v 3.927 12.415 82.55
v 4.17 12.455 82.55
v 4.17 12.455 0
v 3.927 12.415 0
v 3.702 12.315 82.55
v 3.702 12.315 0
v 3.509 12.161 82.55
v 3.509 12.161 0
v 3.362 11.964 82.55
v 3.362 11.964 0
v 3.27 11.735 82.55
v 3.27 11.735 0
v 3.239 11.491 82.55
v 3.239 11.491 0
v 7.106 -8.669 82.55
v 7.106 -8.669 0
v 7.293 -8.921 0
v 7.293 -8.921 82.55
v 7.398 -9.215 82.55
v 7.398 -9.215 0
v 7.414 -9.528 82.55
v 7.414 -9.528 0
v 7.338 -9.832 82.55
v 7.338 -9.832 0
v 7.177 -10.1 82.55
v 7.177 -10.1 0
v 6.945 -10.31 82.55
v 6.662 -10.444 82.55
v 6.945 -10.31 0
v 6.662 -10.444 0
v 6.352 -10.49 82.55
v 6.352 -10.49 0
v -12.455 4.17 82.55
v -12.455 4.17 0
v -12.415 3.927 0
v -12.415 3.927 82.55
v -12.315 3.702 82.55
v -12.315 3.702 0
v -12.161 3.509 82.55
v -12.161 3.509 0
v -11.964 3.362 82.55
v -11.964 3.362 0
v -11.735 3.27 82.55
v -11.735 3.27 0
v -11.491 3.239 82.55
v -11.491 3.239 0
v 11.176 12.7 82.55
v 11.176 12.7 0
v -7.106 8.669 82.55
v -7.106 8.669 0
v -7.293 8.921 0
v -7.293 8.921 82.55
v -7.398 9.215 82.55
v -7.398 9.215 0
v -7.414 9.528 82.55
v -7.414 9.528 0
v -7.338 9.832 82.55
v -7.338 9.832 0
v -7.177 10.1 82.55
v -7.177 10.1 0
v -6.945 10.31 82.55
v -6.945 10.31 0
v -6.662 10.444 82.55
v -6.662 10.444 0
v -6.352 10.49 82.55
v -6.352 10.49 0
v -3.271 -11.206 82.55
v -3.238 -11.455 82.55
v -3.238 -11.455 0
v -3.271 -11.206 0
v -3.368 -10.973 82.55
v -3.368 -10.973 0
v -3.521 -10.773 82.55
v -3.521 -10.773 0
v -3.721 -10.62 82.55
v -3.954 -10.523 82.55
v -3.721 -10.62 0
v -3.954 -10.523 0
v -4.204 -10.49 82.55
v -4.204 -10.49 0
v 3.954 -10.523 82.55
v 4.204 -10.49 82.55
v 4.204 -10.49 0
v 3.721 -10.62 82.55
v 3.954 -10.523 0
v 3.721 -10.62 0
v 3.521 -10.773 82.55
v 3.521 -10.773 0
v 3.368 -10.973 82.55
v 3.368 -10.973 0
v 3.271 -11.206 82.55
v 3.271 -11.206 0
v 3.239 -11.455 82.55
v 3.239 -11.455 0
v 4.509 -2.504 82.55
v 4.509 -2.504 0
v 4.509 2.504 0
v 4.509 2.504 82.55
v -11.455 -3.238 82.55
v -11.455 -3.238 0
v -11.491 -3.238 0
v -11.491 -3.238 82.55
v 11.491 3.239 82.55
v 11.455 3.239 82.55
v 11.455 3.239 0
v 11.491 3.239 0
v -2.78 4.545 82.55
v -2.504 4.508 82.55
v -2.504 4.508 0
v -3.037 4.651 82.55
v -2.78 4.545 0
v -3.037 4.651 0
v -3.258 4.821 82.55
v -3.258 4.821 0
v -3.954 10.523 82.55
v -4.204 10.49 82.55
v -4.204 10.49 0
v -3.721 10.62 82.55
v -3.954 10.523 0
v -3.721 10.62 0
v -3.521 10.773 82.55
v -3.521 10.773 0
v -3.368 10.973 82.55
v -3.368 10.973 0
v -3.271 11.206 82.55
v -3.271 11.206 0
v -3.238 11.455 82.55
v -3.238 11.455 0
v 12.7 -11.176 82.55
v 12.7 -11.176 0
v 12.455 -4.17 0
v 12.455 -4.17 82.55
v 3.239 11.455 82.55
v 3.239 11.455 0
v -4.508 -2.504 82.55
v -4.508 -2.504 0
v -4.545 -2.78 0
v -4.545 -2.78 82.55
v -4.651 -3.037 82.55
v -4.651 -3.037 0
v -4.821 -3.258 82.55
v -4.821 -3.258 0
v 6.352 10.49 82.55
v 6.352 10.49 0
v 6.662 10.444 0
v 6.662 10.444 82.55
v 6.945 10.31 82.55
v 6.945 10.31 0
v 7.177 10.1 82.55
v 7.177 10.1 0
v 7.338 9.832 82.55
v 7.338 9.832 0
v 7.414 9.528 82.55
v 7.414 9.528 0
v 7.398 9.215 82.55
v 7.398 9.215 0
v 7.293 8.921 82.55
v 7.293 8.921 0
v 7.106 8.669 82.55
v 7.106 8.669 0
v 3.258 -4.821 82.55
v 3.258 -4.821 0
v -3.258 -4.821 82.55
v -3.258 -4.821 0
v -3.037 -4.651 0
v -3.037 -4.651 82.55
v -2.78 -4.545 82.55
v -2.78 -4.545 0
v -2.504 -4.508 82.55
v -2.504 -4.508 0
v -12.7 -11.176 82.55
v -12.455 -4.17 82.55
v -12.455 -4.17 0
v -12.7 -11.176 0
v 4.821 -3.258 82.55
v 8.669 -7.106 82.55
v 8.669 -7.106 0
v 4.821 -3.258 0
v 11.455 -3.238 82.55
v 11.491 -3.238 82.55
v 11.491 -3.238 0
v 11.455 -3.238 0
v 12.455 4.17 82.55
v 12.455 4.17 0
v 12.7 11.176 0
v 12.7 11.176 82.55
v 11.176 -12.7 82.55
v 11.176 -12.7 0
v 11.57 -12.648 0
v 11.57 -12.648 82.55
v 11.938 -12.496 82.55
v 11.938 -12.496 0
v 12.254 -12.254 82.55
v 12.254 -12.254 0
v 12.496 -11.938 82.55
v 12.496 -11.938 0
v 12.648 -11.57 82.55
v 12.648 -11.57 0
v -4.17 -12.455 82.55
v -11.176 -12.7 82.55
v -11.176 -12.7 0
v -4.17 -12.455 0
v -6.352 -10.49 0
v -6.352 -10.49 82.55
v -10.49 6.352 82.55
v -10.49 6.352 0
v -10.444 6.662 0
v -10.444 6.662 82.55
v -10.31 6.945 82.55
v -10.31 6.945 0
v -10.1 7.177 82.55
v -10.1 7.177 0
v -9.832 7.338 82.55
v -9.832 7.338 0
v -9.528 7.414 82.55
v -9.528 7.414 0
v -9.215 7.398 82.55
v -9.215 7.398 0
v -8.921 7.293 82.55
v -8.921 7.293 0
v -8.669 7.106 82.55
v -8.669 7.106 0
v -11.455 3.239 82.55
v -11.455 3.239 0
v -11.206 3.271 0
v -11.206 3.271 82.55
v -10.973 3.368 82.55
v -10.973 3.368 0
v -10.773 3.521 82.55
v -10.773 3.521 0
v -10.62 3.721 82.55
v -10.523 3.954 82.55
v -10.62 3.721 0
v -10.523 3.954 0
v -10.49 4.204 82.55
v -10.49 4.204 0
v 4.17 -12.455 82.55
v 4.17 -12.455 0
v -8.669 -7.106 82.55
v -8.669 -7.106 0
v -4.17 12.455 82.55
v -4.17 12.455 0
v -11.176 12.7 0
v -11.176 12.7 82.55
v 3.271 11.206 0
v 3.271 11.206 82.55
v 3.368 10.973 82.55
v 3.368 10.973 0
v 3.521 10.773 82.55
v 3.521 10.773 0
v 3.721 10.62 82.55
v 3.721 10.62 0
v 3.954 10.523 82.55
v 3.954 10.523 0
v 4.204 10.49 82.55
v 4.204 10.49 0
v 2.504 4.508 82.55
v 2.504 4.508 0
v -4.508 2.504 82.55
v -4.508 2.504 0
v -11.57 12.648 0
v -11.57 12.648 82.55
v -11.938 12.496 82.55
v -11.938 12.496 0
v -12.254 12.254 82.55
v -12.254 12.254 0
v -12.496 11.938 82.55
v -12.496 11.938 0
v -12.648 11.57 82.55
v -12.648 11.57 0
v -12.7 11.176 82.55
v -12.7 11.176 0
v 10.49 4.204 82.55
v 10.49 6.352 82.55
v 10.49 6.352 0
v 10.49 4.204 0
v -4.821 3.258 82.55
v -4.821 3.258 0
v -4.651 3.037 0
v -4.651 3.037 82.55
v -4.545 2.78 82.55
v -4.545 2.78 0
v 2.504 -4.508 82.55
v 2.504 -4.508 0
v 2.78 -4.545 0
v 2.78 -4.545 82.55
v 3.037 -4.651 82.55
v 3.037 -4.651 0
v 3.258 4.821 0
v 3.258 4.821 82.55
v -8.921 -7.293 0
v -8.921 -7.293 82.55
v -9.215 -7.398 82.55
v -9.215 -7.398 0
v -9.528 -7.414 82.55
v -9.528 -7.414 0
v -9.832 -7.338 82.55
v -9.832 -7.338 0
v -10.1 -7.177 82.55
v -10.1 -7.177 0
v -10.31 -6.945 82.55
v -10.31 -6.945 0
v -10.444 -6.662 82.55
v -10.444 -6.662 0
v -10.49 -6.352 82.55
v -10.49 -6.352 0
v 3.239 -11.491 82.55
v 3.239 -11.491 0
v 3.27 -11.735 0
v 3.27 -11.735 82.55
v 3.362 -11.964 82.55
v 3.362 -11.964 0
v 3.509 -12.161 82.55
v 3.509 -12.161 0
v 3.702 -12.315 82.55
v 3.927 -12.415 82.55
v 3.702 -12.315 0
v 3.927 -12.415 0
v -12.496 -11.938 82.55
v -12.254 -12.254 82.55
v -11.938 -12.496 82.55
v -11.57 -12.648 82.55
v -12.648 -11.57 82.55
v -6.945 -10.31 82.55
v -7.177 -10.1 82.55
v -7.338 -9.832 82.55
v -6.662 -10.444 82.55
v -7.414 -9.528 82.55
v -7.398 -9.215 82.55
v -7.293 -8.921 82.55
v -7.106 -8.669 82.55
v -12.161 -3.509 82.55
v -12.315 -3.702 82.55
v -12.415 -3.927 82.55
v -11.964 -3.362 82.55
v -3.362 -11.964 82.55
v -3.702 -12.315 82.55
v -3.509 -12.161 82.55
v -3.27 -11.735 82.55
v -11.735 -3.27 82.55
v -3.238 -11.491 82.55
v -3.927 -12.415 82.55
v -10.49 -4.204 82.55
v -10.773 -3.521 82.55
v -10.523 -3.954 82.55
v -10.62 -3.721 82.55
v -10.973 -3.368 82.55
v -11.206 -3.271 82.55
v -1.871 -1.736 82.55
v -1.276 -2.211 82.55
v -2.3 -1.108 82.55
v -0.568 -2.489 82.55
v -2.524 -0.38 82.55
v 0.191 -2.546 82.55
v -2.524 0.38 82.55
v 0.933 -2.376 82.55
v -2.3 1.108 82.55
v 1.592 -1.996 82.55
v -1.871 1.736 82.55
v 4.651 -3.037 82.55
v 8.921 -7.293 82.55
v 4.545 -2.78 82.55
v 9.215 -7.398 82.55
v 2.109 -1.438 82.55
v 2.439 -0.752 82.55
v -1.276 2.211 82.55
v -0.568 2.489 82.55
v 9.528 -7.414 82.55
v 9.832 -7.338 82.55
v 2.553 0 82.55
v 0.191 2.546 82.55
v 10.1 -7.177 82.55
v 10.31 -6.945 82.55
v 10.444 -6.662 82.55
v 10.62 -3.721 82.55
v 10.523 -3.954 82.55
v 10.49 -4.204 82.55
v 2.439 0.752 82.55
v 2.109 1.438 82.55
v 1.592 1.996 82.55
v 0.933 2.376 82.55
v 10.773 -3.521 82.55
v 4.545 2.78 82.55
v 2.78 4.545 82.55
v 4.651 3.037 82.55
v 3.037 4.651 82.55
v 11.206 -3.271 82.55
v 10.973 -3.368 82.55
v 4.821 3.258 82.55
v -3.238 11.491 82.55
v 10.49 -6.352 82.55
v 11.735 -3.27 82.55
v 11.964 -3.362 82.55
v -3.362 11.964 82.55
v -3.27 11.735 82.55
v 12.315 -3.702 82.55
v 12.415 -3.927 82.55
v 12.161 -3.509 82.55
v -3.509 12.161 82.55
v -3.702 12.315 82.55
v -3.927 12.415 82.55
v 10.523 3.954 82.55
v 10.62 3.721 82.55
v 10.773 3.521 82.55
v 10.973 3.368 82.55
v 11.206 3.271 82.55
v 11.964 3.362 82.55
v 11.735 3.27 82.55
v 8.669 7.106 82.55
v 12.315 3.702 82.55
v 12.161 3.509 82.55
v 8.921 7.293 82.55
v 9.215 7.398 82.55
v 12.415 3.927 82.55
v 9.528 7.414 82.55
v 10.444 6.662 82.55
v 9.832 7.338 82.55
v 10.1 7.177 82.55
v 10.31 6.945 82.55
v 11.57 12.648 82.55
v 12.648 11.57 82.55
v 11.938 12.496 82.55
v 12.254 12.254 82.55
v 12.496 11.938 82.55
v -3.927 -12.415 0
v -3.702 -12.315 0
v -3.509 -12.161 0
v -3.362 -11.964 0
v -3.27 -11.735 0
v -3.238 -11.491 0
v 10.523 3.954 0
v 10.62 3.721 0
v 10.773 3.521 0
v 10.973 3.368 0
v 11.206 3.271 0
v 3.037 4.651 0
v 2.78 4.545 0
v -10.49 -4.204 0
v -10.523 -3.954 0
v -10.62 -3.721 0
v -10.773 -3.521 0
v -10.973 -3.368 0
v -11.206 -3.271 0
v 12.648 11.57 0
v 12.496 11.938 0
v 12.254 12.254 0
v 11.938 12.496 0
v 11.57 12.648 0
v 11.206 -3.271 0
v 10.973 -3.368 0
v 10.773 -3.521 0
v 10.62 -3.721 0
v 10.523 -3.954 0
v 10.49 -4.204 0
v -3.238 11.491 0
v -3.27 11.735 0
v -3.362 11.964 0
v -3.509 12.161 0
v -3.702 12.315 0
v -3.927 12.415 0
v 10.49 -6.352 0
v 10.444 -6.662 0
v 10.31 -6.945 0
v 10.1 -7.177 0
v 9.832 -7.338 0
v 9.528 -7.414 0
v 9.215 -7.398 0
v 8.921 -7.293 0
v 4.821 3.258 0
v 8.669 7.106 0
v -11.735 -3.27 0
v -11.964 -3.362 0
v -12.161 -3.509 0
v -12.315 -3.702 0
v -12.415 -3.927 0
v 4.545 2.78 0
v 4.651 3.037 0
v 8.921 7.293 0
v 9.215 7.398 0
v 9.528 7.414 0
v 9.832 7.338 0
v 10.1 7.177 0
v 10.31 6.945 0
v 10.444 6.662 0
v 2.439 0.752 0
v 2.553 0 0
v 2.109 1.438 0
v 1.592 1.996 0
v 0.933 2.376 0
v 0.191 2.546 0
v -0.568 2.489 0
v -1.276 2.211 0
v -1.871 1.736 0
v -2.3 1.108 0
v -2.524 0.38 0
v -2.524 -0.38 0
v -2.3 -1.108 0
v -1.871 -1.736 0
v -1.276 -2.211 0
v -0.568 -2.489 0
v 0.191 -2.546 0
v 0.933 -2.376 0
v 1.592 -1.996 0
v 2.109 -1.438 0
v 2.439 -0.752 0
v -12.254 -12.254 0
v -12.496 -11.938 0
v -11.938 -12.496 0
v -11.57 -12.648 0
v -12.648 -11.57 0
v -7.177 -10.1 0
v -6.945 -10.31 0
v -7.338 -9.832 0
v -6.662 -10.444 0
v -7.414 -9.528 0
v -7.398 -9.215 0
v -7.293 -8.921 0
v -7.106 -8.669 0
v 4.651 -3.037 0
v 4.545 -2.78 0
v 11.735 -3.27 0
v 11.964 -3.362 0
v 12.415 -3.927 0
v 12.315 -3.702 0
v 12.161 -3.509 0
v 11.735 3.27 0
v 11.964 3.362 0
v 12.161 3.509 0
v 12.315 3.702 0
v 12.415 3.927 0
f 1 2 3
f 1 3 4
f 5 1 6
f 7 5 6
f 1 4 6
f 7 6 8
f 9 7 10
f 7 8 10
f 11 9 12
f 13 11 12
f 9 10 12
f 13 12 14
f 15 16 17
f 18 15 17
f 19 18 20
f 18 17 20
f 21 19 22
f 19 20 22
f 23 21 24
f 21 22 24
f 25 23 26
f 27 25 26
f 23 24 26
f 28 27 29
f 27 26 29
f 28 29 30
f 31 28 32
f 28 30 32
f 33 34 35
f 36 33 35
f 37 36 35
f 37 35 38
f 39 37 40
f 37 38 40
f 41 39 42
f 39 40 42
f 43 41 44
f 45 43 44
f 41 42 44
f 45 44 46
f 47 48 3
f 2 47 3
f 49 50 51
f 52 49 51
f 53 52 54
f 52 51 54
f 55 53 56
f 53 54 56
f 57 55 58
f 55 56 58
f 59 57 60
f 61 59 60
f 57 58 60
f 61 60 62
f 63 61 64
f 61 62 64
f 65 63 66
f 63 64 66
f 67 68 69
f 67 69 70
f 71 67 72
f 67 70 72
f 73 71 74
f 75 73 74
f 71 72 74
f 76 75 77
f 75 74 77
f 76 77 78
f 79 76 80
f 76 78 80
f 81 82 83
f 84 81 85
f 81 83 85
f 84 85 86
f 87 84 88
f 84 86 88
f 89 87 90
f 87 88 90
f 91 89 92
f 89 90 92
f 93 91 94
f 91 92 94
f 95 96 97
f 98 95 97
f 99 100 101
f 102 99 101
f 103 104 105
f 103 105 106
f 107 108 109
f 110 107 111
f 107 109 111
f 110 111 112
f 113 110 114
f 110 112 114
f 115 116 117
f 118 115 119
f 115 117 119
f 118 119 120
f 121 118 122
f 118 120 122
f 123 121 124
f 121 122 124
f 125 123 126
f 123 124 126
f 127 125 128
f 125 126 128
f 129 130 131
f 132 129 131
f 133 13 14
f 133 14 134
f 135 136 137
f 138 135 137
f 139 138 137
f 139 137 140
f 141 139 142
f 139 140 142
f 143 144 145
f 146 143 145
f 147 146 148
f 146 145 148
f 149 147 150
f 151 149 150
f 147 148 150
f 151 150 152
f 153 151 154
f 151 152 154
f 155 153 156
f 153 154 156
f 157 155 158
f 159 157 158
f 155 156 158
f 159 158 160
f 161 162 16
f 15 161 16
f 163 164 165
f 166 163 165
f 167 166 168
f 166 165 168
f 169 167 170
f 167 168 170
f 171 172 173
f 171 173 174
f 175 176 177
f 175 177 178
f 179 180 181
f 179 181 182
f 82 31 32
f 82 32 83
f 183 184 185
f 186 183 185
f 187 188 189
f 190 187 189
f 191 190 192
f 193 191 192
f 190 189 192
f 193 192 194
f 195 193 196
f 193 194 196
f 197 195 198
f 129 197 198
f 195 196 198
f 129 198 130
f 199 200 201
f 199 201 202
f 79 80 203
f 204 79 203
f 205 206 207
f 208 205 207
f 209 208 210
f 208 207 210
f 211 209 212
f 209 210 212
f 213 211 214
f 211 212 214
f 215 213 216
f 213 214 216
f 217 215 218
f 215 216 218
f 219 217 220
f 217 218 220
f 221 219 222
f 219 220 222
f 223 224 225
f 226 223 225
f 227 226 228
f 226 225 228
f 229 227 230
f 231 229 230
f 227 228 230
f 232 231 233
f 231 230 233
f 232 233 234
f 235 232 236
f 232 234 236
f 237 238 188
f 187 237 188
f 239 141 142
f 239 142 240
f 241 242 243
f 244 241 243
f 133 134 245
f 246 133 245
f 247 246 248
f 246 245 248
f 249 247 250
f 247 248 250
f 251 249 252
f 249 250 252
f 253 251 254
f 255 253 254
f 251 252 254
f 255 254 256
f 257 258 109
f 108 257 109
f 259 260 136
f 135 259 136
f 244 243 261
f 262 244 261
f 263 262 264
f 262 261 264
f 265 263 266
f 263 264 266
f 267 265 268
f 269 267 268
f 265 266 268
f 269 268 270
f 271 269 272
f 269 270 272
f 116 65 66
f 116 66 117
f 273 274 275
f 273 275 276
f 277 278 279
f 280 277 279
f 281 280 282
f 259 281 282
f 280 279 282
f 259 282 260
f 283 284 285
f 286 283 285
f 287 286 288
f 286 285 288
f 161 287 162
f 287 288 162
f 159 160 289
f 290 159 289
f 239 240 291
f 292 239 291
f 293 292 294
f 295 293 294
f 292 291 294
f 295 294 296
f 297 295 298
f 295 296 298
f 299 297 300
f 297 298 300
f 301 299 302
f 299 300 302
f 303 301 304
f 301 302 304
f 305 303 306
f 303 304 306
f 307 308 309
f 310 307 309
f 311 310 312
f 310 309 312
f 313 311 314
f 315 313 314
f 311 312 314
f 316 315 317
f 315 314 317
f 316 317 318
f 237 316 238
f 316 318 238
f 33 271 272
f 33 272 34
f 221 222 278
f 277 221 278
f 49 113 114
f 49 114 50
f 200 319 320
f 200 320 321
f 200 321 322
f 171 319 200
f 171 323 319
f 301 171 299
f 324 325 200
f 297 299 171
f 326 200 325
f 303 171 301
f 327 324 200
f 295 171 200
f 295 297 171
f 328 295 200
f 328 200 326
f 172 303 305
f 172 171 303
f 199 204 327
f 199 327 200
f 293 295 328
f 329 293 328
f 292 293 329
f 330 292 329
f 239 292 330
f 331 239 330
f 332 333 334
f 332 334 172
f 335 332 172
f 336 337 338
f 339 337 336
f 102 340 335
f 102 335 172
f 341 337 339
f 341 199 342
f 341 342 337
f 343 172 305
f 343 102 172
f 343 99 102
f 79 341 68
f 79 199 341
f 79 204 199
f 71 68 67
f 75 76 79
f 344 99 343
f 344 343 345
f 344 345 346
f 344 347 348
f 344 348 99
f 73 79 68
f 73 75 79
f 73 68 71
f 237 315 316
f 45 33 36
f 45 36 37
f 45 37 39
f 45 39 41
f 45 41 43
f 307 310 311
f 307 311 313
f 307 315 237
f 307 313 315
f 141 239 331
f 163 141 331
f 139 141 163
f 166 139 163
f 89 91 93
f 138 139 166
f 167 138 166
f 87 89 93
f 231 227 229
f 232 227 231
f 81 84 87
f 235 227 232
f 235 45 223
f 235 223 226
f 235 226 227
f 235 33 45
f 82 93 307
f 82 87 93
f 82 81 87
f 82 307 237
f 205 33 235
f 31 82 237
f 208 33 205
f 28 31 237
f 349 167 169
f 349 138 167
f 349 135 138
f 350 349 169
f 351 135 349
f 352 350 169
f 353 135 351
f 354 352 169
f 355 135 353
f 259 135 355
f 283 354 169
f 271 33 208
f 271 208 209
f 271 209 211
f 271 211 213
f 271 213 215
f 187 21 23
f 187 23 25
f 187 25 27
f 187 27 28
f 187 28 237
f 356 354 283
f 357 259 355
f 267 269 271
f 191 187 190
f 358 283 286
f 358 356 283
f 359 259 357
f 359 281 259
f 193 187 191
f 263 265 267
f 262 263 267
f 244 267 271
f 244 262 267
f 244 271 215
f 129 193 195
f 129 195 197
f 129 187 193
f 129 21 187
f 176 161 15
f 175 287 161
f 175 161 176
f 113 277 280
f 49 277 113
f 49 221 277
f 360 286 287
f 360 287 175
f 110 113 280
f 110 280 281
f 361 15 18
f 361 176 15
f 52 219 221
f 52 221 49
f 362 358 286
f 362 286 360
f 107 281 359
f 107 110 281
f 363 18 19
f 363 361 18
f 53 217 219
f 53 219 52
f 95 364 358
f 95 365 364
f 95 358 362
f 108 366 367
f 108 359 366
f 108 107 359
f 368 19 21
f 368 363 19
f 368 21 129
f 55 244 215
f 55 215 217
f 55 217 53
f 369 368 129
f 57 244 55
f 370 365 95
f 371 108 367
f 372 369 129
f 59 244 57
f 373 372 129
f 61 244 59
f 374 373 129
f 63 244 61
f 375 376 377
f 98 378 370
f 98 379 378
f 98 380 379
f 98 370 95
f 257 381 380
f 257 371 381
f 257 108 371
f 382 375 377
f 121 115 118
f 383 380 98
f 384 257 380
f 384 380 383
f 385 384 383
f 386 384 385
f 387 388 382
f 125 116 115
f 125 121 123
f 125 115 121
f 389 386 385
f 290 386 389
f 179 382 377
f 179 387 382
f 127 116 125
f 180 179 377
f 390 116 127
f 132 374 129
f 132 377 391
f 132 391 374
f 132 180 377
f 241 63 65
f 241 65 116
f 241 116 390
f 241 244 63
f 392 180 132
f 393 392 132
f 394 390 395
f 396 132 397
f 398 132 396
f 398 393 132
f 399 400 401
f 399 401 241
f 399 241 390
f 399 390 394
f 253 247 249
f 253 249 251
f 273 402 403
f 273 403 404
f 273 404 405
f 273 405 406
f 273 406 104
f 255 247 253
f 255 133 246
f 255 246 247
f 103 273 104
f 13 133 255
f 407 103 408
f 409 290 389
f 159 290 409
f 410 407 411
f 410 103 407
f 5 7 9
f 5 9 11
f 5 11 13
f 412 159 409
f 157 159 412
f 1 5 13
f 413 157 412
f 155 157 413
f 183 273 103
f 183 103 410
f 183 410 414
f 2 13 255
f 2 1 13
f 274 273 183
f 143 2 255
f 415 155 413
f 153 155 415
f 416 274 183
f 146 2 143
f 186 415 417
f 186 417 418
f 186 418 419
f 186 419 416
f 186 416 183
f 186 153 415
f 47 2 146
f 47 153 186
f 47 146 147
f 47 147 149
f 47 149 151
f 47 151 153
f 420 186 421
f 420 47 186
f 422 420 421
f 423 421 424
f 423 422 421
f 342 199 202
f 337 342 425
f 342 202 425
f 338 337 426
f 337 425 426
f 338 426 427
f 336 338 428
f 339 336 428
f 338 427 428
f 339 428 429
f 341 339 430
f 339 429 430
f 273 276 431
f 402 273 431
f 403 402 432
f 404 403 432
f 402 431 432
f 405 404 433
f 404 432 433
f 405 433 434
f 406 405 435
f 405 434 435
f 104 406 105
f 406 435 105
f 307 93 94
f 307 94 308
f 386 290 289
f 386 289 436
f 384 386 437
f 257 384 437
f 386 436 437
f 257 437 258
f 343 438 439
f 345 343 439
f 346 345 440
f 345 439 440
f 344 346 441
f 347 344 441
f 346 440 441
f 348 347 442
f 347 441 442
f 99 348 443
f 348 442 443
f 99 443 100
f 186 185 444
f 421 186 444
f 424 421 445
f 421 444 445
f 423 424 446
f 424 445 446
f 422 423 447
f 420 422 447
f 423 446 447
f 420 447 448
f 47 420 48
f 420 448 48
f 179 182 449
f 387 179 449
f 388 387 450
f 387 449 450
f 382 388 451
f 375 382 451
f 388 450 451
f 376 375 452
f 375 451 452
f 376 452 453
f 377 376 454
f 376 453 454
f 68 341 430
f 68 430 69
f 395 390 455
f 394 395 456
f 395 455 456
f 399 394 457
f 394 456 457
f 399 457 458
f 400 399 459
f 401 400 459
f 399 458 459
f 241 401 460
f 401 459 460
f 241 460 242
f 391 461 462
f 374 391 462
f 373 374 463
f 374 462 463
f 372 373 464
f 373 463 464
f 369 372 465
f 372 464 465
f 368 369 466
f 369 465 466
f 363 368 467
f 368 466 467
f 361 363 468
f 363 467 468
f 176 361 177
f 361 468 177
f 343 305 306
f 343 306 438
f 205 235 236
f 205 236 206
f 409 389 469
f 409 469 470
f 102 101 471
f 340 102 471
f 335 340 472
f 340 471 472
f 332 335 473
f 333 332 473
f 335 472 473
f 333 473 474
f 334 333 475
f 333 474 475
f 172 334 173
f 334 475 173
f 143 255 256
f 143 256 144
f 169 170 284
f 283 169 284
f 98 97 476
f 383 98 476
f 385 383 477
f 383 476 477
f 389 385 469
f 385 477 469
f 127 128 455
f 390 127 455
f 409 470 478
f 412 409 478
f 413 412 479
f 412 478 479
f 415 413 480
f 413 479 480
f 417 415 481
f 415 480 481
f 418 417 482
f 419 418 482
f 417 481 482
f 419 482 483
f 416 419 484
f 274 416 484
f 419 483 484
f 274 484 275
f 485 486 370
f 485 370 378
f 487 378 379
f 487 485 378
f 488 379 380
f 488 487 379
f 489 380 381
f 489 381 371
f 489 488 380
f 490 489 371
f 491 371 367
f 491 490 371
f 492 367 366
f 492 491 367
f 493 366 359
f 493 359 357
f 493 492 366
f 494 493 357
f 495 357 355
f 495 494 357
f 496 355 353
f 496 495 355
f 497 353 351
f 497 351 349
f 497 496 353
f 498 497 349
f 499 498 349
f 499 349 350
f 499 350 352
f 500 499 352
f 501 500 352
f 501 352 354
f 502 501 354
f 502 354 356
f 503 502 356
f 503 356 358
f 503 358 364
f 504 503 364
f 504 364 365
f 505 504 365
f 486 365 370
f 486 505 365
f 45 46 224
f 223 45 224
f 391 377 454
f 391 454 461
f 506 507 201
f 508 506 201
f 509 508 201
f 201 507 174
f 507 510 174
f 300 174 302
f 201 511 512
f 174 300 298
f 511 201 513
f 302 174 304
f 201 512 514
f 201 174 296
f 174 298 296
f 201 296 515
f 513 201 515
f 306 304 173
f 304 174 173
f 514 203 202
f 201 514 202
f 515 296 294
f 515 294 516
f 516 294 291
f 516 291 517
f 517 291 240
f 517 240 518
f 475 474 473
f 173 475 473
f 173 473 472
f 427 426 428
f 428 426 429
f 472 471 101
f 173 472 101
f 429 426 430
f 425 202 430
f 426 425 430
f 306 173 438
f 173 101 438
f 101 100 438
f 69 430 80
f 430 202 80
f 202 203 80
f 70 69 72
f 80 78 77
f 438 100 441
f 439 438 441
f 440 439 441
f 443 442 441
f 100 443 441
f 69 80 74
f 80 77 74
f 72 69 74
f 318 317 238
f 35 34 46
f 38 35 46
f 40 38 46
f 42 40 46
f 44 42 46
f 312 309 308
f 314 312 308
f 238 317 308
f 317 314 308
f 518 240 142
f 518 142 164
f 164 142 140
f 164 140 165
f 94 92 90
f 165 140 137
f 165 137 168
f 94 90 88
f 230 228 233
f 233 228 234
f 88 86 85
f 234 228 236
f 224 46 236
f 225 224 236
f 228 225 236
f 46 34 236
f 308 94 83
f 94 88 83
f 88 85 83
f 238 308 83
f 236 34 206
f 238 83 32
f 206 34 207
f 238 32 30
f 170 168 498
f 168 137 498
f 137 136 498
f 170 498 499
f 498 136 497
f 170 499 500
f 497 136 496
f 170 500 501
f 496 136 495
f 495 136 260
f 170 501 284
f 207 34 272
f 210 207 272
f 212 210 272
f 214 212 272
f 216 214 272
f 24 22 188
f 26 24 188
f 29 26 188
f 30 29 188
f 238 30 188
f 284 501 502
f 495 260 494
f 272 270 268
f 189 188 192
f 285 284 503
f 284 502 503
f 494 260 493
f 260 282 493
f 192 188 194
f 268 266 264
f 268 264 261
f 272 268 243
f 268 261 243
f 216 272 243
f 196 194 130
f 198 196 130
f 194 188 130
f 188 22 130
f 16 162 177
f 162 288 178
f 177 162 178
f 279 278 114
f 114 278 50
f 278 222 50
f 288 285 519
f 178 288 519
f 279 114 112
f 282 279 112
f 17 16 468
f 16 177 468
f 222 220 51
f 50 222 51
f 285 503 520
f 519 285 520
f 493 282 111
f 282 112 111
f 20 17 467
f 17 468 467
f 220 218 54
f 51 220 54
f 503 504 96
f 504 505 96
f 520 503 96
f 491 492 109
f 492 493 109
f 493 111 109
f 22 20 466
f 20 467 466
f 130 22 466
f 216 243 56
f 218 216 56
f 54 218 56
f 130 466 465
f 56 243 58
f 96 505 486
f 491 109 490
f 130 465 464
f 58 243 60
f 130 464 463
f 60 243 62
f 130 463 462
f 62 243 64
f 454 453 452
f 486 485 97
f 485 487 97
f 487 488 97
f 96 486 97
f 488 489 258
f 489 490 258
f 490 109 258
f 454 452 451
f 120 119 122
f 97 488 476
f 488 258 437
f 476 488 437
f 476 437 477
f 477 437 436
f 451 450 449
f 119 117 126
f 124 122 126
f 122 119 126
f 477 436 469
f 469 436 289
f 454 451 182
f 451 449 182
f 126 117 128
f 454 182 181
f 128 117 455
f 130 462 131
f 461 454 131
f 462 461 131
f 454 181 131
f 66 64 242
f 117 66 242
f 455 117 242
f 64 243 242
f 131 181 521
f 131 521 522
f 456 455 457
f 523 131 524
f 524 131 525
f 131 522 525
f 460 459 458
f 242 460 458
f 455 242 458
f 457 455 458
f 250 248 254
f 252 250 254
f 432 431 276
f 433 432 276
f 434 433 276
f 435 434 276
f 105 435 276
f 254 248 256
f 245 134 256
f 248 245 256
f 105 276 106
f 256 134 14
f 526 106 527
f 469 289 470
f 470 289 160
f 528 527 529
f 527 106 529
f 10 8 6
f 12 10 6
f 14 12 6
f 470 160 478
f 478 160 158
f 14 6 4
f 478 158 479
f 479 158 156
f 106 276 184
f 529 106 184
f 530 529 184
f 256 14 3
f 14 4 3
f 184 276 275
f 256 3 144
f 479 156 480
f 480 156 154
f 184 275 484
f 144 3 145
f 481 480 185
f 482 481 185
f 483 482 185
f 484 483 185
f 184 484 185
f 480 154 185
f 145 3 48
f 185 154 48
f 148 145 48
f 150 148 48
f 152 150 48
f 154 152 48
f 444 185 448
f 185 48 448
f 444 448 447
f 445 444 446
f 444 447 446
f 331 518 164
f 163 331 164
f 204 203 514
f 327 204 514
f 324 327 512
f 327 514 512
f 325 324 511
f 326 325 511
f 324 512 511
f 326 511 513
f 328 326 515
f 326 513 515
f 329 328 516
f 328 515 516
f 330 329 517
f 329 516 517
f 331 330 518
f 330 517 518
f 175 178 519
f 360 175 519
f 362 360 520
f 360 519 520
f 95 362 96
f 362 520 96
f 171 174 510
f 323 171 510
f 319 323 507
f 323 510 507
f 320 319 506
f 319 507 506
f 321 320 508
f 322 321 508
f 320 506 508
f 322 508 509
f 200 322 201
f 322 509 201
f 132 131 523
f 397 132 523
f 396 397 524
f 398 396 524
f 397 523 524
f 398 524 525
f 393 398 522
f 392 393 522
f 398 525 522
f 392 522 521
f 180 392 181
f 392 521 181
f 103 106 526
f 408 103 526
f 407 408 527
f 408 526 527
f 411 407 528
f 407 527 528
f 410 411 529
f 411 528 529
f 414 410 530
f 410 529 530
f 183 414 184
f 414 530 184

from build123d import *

# Parameters (mm, degrees)
SKETCH1_R      = 2.5527
EXTRUDE1_DEPTH = 82.55


with BuildPart() as part:
    # Sketch1 → Extrude1 (new body)
    with BuildSketch(Plane.XY):
        with BuildLine():
            Line((3.238504286, -11.455400345), (3.238504286, -11.49073383))
            ThreePointArc((3.238504286, -11.49073383), (3.509397472, -12.161218003), (4.170019162, -12.455345741))
            Line((4.170019162, -12.455345741), (11.176001705, -12.7))
            ThreePointArc((11.176001705, -12.7), (12.253632411, -12.253630746), (12.700001664, -11.17600004))
            Line((12.700001664, -11.17600004), (12.455347406, -4.170014669))
            ThreePointArc((12.455347406, -4.170014669), (12.16121968, -3.509392954), (11.490735494, -3.238499755))
            Line((11.490735494, -3.238499755), (11.455402009, -3.238499755))
            ThreePointArc((11.455402009, -3.238499755), (10.772902626, -3.521200256), (10.490202125, -4.20369964))
            Line((10.490202125, -4.20369964), (10.490202125, -6.352134987))
            ThreePointArc((10.490202125, -6.352134987), (9.831646779, -7.337732713), (8.669054992, -7.106478829))
            Line((8.669054992, -7.106478829), (4.820959759, -3.258383596))
            ThreePointArc((4.820959759, -3.258383596), (4.589705874, -2.912287699), (4.508500309, -2.504039754))
            Line((4.508500309, -2.504039754), (4.508500309, 2.504040946))
            ThreePointArc((4.508500309, 2.504040946), (4.589705874, 2.912288891), (4.820959759, 3.258384788))
            Line((4.820959759, 3.258384788), (8.669054992, 7.106480021))
            ThreePointArc((8.669054992, 7.106480021), (9.831646779, 7.337733906), (10.490202125, 6.35213618))
            Line((10.490202125, 6.35213618), (10.490202125, 4.203700832))
            ThreePointArc((10.490202125, 4.203700832), (10.772902626, 3.521201448), (11.455402009, 3.238500947))
            Line((11.455402009, 3.238500947), (11.490735494, 3.238500947))
            ThreePointArc((11.490735494, 3.238500947), (12.161219667, 3.509394133), (12.455347406, 4.170015823))
            Line((12.455347406, 4.170015823), (12.700001664, 11.176000039))
            ThreePointArc((12.700001664, 11.176000039), (12.253632411, 12.253630745), (11.176001705, 12.699999999))
            Line((11.176001705, 12.699999999), (4.170019162, 12.455345462))
            ThreePointArc((4.170019162, 12.455345462), (3.509397447, 12.161217736), (3.238504248, 11.49073355))
            Line((3.238504248, 11.49073355), (3.238504248, 11.455400065))
            ThreePointArc((3.238504248, 11.455400065), (3.521204749, 10.772900682), (4.203704132, 10.490200181))
            Line((4.203704132, 10.490200181), (6.35213948, 10.490200181))
            ThreePointArc((6.35213948, 10.490200181), (7.337737205, 9.831644835), (7.106483322, 8.669053049))
            Line((7.106483322, 8.669053049), (3.258388088, 4.820957816))
            ThreePointArc((3.258388088, 4.820957816), (2.912292192, 4.589703931), (2.504044247, 4.508498366))
            Line((2.504044247, 4.508498366), (-2.504036453, 4.508498366))
            ThreePointArc((-2.504036453, 4.508498366), (-2.912284398, 4.589703931), (-3.258380295, 4.820957816))
            Line((-3.258380295, 4.820957816), (-7.106475528, 8.669053049))
            ThreePointArc((-7.106475528, 8.669053049), (-7.337729412, 9.831644836), (-6.352131686, 10.490200182))
            Line((-6.352131686, 10.490200182), (-4.203696339, 10.490200182))
            ThreePointArc((-4.203696339, 10.490200182), (-3.521196955, 10.772900683), (-3.238496454, 11.455400067))
            Line((-3.238496454, 11.455400067), (-3.238496454, 11.490733551))
            ThreePointArc((-3.238496454, 11.490733551), (-3.50938964, 12.161217724), (-4.17001133, 12.455345462))
            Line((-4.17001133, 12.455345462), (-11.175998375, 12.699999999))
            ThreePointArc((-11.175998375, 12.699999999), (-12.253629081, 12.253630745), (-12.699998335, 11.176000039))
            Line((-12.699998335, 11.176000039), (-12.455343798, 4.170015823))
            ThreePointArc((-12.455343798, 4.170015823), (-12.161216073, 3.509394108), (-11.490731887, 3.238500909))
            Line((-11.490731887, 3.238500909), (-11.455398403, 3.238500909))
            ThreePointArc((-11.455398403, 3.238500909), (-10.772899019, 3.52120141), (-10.490198518, 4.203700793))
            Line((-10.490198518, 4.203700793), (-10.490198518, 6.352136141))
            ThreePointArc((-10.490198518, 6.352136141), (-9.831643172, 7.337733867), (-8.669051385, 7.106479983))
            Line((-8.669051385, 7.106479983), (-4.820956152, 3.258384749))
            ThreePointArc((-4.820956152, 3.258384749), (-4.589702267, 2.912288853), (-4.508496702, 2.504040908))
            Line((-4.508496702, 2.504040908), (-4.508496702, -2.504039793))
            ThreePointArc((-4.508496702, -2.504039793), (-4.589702267, -2.912287738), (-4.820956152, -3.258383634))
            Line((-4.820956152, -3.258383634), (-8.669051385, -7.106478867))
            ThreePointArc((-8.669051385, -7.106478867), (-9.831643172, -7.337732752), (-10.490198518, -6.352135026))
            Line((-10.490198518, -6.352135026), (-10.490198518, -4.203699678))
            ThreePointArc((-10.490198518, -4.203699678), (-10.772899019, -3.521200294), (-11.455398403, -3.238499793))
            Line((-11.455398403, -3.238499793), (-11.490731887, -3.238499793))
            ThreePointArc((-11.490731887, -3.238499793), (-12.16121606, -3.509392979), (-12.455343798, -4.170014669))
            Line((-12.455343798, -4.170014669), (-12.699998335, -11.17600004))
            ThreePointArc((-12.699998335, -11.17600004), (-12.253629081, -12.253630746), (-11.175998375, -12.7))
            Line((-11.175998375, -12.7), (-4.17001133, -12.455345741))
            ThreePointArc((-4.17001133, -12.455345741), (-3.509389615, -12.161218016), (-3.238496416, -11.49073383))
            Line((-3.238496416, -11.49073383), (-3.238496416, -11.455400345))
            ThreePointArc((-3.238496416, -11.455400345), (-3.521196917, -10.772900961), (-4.2036963, -10.49020046))
            Line((-4.2036963, -10.49020046), (-6.352131648, -10.49020046))
            ThreePointArc((-6.352131648, -10.49020046), (-7.337729374, -9.831645114), (-7.106475489, -8.669053328))
            Line((-7.106475489, -8.669053328), (-3.258380256, -4.820958094))
            ThreePointArc((-3.258380256, -4.820958094), (-2.91228436, -4.58970421), (-2.504036415, -4.508498645))
            Line((-2.504036415, -4.508498645), (2.504044285, -4.508498645))
            ThreePointArc((2.504044285, -4.508498645), (2.91229223, -4.58970421), (3.258388127, -4.820958094))
            Line((3.258388127, -4.820958094), (7.10648336, -8.669053328))
            ThreePointArc((7.10648336, -8.669053328), (7.337737245, -9.831645114), (6.352139519, -10.49020046))
            Line((6.352139519, -10.49020046), (4.203704171, -10.49020046))
            ThreePointArc((4.203704171, -10.49020046), (3.521204787, -10.772900961), (3.238504286, -11.455400345))
        make_face()
        Circle(SKETCH1_R, mode=Mode.SUBTRACT)
    extrude(amount=EXTRUDE1_DEPTH)


solid = part.part
